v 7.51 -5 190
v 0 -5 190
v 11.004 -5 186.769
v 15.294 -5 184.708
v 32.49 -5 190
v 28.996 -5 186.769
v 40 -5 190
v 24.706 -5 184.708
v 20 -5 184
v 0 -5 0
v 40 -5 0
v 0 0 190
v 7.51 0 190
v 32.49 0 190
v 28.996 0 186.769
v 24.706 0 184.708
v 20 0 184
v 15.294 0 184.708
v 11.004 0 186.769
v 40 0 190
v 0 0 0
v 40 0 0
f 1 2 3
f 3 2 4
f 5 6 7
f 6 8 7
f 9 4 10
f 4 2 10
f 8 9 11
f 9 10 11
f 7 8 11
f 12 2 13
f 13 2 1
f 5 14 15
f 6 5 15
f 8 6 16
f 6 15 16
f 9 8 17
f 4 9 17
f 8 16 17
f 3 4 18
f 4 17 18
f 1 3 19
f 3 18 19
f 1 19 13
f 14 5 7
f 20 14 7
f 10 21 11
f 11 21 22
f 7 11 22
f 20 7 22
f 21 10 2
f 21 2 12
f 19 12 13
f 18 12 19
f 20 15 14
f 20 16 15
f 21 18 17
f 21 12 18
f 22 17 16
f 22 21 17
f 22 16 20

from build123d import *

# Parameters (mm, degrees)
SKETCH_1_W          = 40
SKETCH_1_H          = 5
EXTRUDE_1_DEPTH     = 200
SKETCH_2_R          = 16
CUT_EXTRUDE_1_DEPTH = 6
SKETCH_3_W          = 40
SKETCH_3_H          = 10
CUT_EXTRUDE_2_DEPTH = 6


with BuildPart() as part:
    # Эскиз1 → Бобышка-Вытянуть1 (new body)
    with BuildSketch(Plane.XY):
        with Locations((20, -2.5)):
            Rectangle(SKETCH_1_W, SKETCH_1_H)
    extrude(amount=EXTRUDE_1_DEPTH)

    # Эскиз2 → Вырез-Вытянуть1 (cut, through all)
    with BuildSketch(Plane(origin=(0, 0, 0), x_dir=(1, 0, 0), z_dir=(0, 1, 0))):
        with Locations((20, -200)):
            Circle(SKETCH_2_R)
    extrude(amount=-CUT_EXTRUDE_1_DEPTH, mode=Mode.SUBTRACT)

    # Эскиз3 → Вырез-Вытянуть2 (cut, through all)
    with BuildSketch(Plane.XZ.offset(5)):
        with Locations((20, 195)):
            Rectangle(SKETCH_3_W, SKETCH_3_H)
    extrude(amount=-CUT_EXTRUDE_2_DEPTH, mode=Mode.SUBTRACT)


solid = part.part
